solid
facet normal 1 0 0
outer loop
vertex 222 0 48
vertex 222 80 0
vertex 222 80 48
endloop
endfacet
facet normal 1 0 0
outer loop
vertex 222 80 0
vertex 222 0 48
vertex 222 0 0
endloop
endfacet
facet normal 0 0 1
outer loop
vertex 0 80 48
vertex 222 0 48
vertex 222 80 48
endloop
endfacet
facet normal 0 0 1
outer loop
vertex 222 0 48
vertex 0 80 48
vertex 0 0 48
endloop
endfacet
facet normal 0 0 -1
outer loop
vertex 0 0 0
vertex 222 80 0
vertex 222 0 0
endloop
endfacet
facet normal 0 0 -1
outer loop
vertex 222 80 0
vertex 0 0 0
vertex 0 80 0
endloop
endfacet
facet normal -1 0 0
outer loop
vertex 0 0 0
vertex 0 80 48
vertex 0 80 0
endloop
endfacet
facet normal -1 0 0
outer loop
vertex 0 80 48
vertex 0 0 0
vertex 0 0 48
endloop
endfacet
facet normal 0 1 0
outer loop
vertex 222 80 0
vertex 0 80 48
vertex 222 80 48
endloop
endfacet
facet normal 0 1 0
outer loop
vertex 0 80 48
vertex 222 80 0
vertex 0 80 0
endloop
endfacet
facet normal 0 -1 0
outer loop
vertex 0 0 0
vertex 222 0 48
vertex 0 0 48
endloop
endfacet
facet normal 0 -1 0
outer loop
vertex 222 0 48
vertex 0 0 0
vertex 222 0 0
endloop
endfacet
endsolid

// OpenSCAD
module hollow_box(length, width, height, wall_thickness) {
  // Outer box
  cube([length, width, height]);

  // Inner box (subtracted)
  difference() {
    cube([length, width, height]);
    translate([wall_thickness, wall_thickness, wall_thickness])
    cube([length - 2 * wall_thickness, width - 2 * wall_thickness, height - 2 * wall_thickness]);
  }
}


// Example usage:
length = 222;
width = 80;
height = 48;
wall_thickness = 3;

hollow_box(length, width, height, wall_thickness);
